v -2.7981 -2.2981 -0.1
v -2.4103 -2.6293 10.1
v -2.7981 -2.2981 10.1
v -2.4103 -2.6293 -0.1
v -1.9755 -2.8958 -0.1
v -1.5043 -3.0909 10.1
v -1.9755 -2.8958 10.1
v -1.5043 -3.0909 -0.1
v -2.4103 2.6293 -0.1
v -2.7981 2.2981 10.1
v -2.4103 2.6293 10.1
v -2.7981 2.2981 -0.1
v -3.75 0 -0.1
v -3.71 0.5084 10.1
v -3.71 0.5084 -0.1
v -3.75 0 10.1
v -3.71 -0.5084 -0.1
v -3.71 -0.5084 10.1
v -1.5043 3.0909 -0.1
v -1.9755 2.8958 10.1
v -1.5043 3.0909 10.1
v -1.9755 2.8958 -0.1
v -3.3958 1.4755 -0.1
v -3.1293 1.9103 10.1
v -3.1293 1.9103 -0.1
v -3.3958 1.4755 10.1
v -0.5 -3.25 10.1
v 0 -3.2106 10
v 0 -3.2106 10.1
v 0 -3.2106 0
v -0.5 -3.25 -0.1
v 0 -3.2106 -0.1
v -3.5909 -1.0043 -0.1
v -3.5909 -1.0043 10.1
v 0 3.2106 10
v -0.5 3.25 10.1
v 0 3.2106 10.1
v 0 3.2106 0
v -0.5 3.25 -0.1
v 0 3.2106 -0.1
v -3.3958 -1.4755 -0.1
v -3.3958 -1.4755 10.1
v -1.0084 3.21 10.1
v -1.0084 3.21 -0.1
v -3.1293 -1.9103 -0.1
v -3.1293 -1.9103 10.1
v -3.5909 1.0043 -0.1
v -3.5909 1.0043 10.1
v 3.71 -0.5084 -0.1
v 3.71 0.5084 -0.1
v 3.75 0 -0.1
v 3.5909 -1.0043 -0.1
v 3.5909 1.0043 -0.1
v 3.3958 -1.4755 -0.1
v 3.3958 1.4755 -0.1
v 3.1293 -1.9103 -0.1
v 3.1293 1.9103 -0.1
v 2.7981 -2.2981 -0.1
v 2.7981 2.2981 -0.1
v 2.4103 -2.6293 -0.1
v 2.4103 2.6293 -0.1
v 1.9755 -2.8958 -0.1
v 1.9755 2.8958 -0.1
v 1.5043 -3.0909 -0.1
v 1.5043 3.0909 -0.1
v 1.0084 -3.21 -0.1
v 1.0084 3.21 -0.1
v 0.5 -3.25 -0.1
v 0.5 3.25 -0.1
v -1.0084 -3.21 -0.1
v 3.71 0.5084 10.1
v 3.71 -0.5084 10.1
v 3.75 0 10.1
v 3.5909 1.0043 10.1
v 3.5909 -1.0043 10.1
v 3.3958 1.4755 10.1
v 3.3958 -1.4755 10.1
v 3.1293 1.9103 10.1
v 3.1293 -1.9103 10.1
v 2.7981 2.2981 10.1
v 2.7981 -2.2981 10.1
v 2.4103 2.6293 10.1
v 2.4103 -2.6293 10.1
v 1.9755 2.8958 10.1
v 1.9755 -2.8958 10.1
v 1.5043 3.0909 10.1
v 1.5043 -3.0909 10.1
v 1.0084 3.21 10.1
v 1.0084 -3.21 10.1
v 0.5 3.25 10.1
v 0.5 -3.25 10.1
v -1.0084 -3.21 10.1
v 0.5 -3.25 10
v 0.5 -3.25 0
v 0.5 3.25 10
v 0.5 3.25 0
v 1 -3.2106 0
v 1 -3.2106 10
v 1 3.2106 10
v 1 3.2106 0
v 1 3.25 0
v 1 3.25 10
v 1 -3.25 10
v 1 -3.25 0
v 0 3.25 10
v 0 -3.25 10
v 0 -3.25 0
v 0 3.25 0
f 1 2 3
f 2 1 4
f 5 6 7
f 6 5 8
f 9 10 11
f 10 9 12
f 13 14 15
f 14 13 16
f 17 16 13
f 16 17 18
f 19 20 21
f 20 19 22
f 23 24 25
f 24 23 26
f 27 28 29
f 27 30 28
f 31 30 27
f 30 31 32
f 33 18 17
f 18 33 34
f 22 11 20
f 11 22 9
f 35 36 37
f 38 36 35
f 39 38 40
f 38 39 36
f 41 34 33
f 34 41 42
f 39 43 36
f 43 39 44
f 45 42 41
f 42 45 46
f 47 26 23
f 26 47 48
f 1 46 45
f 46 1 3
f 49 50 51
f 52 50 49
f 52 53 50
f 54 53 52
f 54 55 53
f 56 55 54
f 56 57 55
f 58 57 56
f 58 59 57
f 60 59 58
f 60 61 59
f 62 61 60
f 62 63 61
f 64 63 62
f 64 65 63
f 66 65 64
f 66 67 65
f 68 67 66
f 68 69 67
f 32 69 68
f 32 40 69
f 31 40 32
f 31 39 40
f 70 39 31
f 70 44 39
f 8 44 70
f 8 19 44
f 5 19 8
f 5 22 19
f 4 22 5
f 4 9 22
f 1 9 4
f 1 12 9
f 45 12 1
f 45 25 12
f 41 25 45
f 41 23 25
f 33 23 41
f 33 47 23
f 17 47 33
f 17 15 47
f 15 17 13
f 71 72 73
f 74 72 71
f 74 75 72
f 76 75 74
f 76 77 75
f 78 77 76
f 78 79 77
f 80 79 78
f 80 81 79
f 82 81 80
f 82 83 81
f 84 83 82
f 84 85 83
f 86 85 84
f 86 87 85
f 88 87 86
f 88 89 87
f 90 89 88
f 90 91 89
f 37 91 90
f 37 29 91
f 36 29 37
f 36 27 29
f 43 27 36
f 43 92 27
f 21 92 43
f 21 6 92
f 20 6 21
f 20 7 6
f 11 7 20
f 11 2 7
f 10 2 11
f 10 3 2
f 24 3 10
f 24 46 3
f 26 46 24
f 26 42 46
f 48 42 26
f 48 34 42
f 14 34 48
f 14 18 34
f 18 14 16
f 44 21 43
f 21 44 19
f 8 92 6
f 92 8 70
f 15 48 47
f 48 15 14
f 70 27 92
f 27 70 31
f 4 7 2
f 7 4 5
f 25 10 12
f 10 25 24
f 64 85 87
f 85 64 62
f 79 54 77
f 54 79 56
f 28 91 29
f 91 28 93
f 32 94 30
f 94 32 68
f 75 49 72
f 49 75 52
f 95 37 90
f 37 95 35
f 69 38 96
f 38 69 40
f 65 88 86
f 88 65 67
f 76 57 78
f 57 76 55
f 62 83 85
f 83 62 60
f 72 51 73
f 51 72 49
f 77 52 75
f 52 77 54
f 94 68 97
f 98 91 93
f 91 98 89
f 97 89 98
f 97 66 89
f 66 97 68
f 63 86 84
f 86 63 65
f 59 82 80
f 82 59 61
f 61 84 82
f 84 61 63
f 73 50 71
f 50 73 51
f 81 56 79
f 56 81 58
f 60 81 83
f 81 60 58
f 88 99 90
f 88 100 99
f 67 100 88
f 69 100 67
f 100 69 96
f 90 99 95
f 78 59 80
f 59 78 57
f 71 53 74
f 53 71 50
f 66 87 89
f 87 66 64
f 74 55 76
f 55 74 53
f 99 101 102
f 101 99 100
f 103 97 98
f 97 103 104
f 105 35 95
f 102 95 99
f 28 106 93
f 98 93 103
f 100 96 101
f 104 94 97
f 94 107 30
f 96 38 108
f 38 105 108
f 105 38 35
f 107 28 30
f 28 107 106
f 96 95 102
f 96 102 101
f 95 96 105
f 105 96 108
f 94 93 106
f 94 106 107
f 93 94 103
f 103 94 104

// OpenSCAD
// file: mirror_copy.scad
module mirror_copy(vector=[1,0,0]){
    children();
    mirror(vector) children();
}
// main file
use <mirror_copy.scad>
slot(d=6.5,l=1,h=10,centre=false);

module slot(d=10,l=50,h=10,help=false,centre=true){
    if(help)echo("slot(d=10,l=50,h=10)");
    mirror_copy([1,0,0]) translate([-l/2,0,-0.1]) cylinder(h=h+0.2,d=d,$fn=40,center=centre);
    if(centre)
        cube([l,d,h],center=centre);
    else
        translate([0,-d/2,0])cube([l,d,h],center=centre);
}
 
